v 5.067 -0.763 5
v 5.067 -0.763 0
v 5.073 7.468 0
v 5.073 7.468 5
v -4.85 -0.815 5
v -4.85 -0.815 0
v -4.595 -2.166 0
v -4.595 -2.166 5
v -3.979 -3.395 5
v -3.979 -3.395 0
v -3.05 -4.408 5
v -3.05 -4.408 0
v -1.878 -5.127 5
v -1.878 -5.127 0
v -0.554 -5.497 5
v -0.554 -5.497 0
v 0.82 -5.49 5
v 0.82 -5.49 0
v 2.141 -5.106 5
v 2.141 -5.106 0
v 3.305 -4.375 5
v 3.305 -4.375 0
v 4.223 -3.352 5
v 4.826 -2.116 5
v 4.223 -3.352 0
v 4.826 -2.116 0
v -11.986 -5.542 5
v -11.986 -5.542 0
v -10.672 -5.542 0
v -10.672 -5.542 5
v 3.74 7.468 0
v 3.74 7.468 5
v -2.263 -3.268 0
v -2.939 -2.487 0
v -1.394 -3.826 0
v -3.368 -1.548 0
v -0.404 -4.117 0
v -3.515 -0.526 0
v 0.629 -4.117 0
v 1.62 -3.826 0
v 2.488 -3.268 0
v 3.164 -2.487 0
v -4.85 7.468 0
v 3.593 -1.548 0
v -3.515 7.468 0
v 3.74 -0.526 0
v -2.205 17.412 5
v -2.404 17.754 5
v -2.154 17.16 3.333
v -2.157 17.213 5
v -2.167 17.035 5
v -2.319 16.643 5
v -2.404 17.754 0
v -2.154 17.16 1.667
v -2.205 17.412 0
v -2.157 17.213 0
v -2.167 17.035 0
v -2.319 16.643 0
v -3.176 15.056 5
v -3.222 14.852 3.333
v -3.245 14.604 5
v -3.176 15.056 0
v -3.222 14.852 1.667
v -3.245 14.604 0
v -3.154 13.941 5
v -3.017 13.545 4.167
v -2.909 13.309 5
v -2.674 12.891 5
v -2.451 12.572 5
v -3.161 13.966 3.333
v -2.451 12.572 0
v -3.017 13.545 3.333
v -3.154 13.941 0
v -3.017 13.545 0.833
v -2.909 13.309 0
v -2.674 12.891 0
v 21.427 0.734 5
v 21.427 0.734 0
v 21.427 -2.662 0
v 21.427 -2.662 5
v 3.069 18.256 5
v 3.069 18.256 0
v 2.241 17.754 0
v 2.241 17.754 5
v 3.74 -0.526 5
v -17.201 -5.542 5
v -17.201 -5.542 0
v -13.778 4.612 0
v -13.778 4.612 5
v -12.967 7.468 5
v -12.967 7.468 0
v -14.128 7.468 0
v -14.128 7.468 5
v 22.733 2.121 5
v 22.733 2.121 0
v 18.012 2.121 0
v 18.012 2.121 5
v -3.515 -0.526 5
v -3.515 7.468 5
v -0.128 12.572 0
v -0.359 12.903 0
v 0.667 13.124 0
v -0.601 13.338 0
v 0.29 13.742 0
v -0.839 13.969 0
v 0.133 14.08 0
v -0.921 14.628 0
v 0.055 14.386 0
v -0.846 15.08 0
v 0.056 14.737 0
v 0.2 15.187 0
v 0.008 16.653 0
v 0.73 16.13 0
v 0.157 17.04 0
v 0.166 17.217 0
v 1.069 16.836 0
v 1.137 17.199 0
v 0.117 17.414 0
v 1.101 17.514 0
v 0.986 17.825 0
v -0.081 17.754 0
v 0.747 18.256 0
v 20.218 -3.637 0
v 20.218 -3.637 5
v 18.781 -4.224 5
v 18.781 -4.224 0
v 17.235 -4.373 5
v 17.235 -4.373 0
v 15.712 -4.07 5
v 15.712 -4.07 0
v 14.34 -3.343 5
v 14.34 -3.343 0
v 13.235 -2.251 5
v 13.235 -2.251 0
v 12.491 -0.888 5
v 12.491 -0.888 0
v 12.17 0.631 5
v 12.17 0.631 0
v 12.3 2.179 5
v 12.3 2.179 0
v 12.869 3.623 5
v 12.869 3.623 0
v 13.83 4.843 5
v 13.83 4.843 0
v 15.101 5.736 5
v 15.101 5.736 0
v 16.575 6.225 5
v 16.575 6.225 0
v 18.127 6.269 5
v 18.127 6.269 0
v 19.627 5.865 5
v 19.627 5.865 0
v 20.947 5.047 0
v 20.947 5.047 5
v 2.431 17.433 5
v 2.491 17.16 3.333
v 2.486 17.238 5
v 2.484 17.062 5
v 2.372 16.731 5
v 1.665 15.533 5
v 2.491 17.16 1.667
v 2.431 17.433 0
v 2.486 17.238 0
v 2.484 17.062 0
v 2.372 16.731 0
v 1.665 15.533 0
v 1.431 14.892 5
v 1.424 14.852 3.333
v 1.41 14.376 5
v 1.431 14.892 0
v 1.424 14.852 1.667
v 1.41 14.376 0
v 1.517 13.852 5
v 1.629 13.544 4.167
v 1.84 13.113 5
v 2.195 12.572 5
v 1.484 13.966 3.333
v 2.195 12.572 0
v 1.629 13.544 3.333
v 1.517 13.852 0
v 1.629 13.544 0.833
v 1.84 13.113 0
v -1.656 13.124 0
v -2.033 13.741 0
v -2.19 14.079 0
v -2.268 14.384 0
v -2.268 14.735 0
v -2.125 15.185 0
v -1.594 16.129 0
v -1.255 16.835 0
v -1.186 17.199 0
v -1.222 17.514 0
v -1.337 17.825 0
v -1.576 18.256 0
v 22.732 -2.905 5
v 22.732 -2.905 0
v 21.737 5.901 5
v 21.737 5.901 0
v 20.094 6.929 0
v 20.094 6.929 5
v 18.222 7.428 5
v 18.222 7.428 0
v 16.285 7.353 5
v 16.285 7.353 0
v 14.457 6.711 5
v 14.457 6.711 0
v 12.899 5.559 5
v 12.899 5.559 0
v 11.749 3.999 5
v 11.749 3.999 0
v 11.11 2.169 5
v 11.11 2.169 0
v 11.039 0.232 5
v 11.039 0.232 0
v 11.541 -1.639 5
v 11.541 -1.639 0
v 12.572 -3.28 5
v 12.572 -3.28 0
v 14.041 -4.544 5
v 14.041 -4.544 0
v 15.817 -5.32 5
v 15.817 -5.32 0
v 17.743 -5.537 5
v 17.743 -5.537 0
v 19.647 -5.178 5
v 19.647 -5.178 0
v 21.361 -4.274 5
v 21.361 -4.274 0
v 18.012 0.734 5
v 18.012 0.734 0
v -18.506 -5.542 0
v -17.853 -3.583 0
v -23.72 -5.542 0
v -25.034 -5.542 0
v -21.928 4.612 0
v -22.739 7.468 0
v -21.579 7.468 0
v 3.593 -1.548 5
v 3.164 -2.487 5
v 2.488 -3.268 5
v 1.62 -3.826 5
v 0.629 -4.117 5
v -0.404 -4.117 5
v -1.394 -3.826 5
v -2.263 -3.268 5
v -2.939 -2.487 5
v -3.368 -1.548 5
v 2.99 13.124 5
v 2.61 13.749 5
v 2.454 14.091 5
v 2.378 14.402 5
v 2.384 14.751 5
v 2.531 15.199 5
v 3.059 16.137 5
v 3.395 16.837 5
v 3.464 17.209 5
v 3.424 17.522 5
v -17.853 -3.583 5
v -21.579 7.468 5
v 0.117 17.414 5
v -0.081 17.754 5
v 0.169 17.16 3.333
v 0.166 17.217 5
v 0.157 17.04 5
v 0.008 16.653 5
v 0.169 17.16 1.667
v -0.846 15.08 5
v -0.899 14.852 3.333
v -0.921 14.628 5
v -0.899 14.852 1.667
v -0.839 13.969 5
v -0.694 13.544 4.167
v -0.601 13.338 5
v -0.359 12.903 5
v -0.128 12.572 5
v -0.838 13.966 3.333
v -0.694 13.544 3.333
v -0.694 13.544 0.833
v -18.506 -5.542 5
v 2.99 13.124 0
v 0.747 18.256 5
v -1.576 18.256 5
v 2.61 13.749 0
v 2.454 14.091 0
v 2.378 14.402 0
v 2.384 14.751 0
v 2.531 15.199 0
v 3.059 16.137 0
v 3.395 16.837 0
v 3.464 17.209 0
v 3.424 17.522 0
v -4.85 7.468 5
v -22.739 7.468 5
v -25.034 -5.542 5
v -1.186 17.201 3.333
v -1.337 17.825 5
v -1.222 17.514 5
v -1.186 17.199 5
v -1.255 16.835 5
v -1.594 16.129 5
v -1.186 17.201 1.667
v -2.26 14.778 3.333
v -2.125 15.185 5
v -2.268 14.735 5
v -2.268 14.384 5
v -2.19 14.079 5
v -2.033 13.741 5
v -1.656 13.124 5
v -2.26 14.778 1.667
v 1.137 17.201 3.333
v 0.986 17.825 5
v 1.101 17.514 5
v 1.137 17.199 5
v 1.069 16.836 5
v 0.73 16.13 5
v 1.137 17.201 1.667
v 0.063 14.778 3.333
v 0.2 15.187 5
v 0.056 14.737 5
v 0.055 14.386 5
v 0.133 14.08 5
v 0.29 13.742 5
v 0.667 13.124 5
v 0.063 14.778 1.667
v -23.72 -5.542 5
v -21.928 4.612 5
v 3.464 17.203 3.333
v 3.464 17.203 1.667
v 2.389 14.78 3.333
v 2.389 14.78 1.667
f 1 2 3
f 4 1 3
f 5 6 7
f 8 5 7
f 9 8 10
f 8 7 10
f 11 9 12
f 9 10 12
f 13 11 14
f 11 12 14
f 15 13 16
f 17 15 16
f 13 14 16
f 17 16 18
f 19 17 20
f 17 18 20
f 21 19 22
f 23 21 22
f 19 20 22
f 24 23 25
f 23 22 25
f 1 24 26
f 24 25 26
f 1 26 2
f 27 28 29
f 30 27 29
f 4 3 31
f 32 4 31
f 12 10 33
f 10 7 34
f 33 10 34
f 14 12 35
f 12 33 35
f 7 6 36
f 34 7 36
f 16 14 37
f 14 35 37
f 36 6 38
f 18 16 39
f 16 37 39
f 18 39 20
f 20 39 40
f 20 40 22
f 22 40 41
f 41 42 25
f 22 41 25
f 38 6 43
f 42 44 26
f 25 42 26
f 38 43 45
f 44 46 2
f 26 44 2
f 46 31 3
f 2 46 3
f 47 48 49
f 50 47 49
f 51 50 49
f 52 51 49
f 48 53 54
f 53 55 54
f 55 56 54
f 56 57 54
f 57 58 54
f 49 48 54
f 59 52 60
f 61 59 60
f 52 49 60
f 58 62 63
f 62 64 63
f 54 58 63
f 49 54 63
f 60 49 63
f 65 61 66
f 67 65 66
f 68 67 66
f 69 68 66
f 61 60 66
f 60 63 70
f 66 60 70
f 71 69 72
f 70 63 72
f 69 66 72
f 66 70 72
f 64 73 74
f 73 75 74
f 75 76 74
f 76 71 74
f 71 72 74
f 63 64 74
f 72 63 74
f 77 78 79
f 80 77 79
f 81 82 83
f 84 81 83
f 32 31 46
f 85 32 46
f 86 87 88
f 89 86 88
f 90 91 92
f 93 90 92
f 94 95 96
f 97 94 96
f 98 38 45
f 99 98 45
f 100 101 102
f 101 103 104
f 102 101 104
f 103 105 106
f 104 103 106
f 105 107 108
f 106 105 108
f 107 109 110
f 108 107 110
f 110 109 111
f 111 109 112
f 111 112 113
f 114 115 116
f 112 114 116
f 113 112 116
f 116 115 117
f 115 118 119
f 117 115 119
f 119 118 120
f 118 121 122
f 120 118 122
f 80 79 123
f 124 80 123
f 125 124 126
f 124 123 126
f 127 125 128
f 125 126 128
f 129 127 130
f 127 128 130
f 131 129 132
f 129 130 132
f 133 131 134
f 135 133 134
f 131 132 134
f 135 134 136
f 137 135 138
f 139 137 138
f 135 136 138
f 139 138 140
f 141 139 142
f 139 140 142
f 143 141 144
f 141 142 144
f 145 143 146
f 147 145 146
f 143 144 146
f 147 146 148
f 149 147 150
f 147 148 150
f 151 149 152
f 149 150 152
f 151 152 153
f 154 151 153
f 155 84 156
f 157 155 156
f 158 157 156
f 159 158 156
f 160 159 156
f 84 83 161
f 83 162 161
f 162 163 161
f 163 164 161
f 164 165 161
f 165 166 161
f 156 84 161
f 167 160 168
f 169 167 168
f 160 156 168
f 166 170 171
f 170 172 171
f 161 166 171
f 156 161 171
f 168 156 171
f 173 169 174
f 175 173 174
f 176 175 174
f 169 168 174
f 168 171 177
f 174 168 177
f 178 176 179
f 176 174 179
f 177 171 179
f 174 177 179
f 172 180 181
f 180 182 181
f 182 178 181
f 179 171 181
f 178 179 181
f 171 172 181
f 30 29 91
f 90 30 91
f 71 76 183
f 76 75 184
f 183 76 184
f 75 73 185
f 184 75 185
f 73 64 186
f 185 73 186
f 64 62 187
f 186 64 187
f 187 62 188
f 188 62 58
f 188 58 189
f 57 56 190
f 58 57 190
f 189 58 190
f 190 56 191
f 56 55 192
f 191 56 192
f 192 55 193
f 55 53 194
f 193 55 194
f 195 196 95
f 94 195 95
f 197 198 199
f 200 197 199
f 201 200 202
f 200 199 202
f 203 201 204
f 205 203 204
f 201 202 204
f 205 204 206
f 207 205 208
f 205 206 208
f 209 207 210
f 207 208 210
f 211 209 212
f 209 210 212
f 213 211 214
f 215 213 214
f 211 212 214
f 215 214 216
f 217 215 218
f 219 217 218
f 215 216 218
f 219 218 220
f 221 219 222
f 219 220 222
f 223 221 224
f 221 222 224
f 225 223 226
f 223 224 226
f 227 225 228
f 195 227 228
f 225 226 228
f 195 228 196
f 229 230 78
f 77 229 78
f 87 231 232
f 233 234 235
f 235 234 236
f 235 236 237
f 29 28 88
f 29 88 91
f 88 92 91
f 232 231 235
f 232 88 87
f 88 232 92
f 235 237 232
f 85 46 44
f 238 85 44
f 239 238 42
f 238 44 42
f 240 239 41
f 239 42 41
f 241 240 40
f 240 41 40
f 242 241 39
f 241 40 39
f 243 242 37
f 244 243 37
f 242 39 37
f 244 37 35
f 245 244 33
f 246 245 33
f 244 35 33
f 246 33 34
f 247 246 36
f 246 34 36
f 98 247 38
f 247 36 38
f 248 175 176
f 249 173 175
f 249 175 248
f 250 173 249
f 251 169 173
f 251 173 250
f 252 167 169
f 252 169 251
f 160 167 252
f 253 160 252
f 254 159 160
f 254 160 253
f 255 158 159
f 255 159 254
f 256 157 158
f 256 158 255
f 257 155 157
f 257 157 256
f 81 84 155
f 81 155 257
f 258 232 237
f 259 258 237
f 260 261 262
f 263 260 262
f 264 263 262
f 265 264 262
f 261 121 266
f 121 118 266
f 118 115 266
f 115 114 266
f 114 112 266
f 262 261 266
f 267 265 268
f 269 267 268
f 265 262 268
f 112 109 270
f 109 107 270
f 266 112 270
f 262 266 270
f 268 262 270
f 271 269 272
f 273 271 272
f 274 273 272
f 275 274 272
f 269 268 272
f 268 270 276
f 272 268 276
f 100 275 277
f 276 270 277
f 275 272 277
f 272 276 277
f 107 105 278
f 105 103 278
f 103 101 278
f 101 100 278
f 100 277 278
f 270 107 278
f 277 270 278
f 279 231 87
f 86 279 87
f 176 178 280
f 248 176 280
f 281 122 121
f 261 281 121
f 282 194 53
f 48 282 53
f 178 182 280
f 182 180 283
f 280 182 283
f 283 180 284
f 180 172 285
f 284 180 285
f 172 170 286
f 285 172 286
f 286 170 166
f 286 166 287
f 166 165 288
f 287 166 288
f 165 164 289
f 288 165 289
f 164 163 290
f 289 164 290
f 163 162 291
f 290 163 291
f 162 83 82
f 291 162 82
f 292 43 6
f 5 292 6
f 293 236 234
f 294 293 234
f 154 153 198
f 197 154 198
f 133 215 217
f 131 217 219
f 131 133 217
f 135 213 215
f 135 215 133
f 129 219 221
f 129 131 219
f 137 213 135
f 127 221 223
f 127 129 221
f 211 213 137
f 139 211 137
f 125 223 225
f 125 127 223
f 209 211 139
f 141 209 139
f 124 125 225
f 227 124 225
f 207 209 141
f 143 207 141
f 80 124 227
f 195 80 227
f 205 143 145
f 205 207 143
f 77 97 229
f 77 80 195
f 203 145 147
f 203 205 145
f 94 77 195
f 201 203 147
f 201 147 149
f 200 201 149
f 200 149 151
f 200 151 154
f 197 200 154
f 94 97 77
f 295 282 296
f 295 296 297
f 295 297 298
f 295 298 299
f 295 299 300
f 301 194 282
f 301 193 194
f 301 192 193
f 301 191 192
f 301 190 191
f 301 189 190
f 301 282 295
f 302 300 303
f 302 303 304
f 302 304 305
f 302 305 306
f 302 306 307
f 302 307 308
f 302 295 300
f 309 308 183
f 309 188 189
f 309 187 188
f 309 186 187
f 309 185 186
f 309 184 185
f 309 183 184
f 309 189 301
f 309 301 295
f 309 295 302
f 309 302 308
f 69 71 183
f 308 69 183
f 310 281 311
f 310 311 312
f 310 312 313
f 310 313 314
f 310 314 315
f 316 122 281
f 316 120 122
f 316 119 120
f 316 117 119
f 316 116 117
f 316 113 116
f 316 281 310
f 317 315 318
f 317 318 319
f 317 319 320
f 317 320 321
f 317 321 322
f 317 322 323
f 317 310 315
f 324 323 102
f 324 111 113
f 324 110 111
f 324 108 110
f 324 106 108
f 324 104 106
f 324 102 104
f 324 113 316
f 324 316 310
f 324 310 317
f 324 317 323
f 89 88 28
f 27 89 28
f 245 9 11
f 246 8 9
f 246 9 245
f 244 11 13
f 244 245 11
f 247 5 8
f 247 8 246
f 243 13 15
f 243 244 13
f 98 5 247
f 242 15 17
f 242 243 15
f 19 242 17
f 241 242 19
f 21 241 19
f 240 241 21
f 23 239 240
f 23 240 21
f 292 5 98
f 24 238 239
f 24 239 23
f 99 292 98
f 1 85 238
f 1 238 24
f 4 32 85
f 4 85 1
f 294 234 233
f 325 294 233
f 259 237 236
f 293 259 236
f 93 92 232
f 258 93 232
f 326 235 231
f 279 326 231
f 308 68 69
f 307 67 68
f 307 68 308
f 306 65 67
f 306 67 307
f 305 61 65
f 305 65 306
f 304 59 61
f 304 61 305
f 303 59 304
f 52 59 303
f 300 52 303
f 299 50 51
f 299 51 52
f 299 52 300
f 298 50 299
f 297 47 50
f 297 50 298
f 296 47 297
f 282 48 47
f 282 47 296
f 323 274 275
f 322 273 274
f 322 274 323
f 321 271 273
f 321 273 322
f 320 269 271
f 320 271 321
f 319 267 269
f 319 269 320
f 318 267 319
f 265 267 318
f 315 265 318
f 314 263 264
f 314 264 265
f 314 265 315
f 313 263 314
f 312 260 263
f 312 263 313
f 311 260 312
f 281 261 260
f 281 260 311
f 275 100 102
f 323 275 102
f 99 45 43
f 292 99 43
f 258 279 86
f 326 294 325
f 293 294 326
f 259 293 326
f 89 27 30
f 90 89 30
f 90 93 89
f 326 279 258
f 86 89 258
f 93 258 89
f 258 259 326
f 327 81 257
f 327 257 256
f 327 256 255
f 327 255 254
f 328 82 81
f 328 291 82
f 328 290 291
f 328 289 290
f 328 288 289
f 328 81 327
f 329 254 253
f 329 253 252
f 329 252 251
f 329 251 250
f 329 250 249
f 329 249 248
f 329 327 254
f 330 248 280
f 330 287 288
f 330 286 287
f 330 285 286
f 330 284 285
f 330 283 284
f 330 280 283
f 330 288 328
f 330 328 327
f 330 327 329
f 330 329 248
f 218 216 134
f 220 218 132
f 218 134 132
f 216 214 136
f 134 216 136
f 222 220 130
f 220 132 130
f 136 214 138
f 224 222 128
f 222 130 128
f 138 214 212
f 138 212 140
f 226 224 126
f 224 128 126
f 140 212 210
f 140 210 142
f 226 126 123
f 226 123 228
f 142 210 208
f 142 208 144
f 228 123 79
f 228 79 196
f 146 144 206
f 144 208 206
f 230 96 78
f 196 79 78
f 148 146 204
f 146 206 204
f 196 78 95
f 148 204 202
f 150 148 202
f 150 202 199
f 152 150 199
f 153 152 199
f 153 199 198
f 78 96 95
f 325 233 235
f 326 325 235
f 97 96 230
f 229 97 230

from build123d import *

# Parameters (mm, degrees)
F1_DEPTH = 5


with BuildPart() as f1:
    # F0 (on Top) → F1 (new body)
    with BuildSketch(Plane.XY):
        Polygon((-21.5786790927, 7.467948366), (-22.7388322805, 7.467948366), (-25.0340236803, -5.5416743271), (-23.7198919965, -5.5416743271), (-21.9284930243, 4.6120621264), (-18.5057642846, -5.5416743271), (-17.2005520178, -5.5416743271), (-13.7776314257, 4.6120621264), (-11.9862305908, -5.5416743271), (-10.6721068363, -5.5416743271), (-12.9673324977, 7.467948366), (-14.1276714844, 7.467948366), (-17.8531811093, -3.5832603462), align=None)
    extrude(amount=F1_DEPTH)


with BuildPart() as f1b:
    # F0 (on Top) → F1, piece 2 (new body)
    with BuildSketch(Plane.XY):
        with BuildLine():
            Line((-3.5150047368, 7.467948366), (-4.8504956092, 7.467948366))
            Line((-4.8504956092, 7.467948366), (-4.8504956092, -0.8150014946))
            ThreePointArc((-4.8504956092, -0.8150014946), (0.1333450821, -5.5416059747), (5.067300892, -0.7629515603))
            Line((5.067300892, -0.7629515603), (5.0732250349, 7.467948366))
            Line((5.0732250349, 7.467948366), (3.7401448028, 7.467948366))
            Line((3.7401448028, 7.467948366), (3.7401448028, -0.526181655))
            ThreePointArc((3.7401448028, -0.526181655), (0.112570033, -4.1537564248), (-3.5150047368, -0.526181655))
            Line((-3.5150047368, -0.526181655), (-3.5150047368, 7.467948366))
        make_face()
    extrude(amount=F1_DEPTH)


with BuildPart() as f1c:
    # F0 (on Top) → F1, piece 3 (new body)
    with BuildSketch(Plane.XY):
        with BuildLine():
            ThreePointArc((21.4267385223, -2.6619257999), (12.1702430072, 0.6311876273), (20.9468259269, 5.0469432273))
            Line((20.9468259269, 5.0469432273), (21.7368428626, 5.9009301617))
            ThreePointArc((21.7368428626, 5.9009301617), (11.0387314281, 0.2324106833), (22.7323340003, -2.9046835494))
            Line((22.7323340003, -2.9046835494), (22.7325333034, 2.1210856853))
            Line((22.7325333034, 2.1210856853), (18.011914355, 2.1210856853))
            Line((18.011914355, 2.1210856853), (18.011914355, 0.7342459052))
            Line((18.011914355, 0.7342459052), (21.4267385223, 0.7342459052))
            Line((21.4267385223, 0.7342459052), (21.4267385223, -2.6619257999))
        make_face()
    extrude(amount=F1_DEPTH)


with BuildPart() as f1d:
    # F0 (on Top) → F1, piece 4 (new body)
    with BuildSketch(Plane.XY):
        with BuildLine():
            Line((3.0693569244, 18.2559140958), (2.2414493398, 17.7537132986))
            add(Edge.make_bspline(
                [(2.2414493398, 17.7537132986), (2.2599919723, 17.6987205632), (2.9524971433, 16.9781940353), (0.6802018522, 14.9656995494), (1.859915292, 13.0051726103), (2.1948068427, 12.5717944466)],
                knots=[0, 0, 0, 0, 0.2032399197, 0.6071054215, 1, 1, 1, 1], degree=3))
            Line((2.1948068427, 12.5717944466), (2.990305333, 13.1242028438))
            add(Edge.make_bspline(
                [(3.0693569244, 18.2559140958), (3.114149815, 18.1336426176), (4.0349946493, 17.0319569138), (1.7903811181, 14.7935746608), (2.6649999456, 13.6530040763), (2.990305333, 13.1242028438)],
                knots=[0, 0, 0, 0, 0.264062889, 0.6695137425, 1, 1, 1, 1], degree=3))
        make_face()
    extrude(amount=F1_DEPTH)


with BuildPart() as f1e:
    # F0 (on Top) → F1, piece 5 (new body)
    with BuildSketch(Plane.XY):
        with BuildLine():
            Line((0.7467026846, 18.2559140958), (-0.0812128162, 17.7537132986))
            add(Edge.make_bspline(
                [(-0.0812128162, 17.7537132986), (-0.0599809898, 17.6963363774), (0.6272570502, 16.9806336422), (-1.6419783817, 14.9648828927), (-0.4629439318, 13.0051763463), (-0.1280494942, 12.5717944466)],
                knots=[0, 0, 0, 0, 0.2032165532, 0.6071020345, 1, 1, 1, 1], degree=3))
            Line((-0.1280494942, 12.5717944466), (0.6674517901, 13.1242028438))
            add(Edge.make_bspline(
                [(0.7467026846, 18.2559140958), (0.7915099986, 18.1336032459), (1.7068821832, 17.0290268034), (-0.5367836065, 14.7910556084), (0.34222667, 13.6528735977), (0.6674517901, 13.1242028438)],
                knots=[0, 0, 0, 0, 0.2641479178, 0.6695952881, 1, 1, 1, 1], degree=3))
        make_face()
    extrude(amount=F1_DEPTH)


with BuildPart() as f1f:
    # F0 (on Top) → F1, piece 6 (new body)
    with BuildSketch(Plane.XY):
        with BuildLine():
            Line((-1.5763529553, 18.2561124675), (-2.4042717157, 17.7539023571))
            add(Edge.make_bspline(
                [(-2.4042717157, 17.7539023571), (-2.3843572451, 17.7010013722), (-1.6945717303, 16.976400791), (-3.9649355469, 14.9667301398), (-2.7860082662, 13.0053763278), (-2.4511125846, 12.5719928183)],
                knots=[0, 0, 0, 0, 0.2032391985, 0.6071005751, 1, 1, 1, 1], degree=3))
            Line((-2.4511125846, 12.5719928183), (-1.65561456, 13.1242028438))
            add(Edge.make_bspline(
                [(-1.5763529553, 18.2561124675), (-1.5315447766, 18.1337992574), (-0.6166401411, 17.0289341306), (-2.8602318883, 14.7910492711), (-1.980842263, 13.6528777963), (-1.65561456, 13.1242028438)],
                knots=[0, 0, 0, 0, 0.2641530151, 0.6695926641, 1, 1, 1, 1], degree=3))
        make_face()
    extrude(amount=F1_DEPTH)


solid = Compound([f1.part, f1b.part, f1c.part, f1d.part, f1e.part, f1f.part])
